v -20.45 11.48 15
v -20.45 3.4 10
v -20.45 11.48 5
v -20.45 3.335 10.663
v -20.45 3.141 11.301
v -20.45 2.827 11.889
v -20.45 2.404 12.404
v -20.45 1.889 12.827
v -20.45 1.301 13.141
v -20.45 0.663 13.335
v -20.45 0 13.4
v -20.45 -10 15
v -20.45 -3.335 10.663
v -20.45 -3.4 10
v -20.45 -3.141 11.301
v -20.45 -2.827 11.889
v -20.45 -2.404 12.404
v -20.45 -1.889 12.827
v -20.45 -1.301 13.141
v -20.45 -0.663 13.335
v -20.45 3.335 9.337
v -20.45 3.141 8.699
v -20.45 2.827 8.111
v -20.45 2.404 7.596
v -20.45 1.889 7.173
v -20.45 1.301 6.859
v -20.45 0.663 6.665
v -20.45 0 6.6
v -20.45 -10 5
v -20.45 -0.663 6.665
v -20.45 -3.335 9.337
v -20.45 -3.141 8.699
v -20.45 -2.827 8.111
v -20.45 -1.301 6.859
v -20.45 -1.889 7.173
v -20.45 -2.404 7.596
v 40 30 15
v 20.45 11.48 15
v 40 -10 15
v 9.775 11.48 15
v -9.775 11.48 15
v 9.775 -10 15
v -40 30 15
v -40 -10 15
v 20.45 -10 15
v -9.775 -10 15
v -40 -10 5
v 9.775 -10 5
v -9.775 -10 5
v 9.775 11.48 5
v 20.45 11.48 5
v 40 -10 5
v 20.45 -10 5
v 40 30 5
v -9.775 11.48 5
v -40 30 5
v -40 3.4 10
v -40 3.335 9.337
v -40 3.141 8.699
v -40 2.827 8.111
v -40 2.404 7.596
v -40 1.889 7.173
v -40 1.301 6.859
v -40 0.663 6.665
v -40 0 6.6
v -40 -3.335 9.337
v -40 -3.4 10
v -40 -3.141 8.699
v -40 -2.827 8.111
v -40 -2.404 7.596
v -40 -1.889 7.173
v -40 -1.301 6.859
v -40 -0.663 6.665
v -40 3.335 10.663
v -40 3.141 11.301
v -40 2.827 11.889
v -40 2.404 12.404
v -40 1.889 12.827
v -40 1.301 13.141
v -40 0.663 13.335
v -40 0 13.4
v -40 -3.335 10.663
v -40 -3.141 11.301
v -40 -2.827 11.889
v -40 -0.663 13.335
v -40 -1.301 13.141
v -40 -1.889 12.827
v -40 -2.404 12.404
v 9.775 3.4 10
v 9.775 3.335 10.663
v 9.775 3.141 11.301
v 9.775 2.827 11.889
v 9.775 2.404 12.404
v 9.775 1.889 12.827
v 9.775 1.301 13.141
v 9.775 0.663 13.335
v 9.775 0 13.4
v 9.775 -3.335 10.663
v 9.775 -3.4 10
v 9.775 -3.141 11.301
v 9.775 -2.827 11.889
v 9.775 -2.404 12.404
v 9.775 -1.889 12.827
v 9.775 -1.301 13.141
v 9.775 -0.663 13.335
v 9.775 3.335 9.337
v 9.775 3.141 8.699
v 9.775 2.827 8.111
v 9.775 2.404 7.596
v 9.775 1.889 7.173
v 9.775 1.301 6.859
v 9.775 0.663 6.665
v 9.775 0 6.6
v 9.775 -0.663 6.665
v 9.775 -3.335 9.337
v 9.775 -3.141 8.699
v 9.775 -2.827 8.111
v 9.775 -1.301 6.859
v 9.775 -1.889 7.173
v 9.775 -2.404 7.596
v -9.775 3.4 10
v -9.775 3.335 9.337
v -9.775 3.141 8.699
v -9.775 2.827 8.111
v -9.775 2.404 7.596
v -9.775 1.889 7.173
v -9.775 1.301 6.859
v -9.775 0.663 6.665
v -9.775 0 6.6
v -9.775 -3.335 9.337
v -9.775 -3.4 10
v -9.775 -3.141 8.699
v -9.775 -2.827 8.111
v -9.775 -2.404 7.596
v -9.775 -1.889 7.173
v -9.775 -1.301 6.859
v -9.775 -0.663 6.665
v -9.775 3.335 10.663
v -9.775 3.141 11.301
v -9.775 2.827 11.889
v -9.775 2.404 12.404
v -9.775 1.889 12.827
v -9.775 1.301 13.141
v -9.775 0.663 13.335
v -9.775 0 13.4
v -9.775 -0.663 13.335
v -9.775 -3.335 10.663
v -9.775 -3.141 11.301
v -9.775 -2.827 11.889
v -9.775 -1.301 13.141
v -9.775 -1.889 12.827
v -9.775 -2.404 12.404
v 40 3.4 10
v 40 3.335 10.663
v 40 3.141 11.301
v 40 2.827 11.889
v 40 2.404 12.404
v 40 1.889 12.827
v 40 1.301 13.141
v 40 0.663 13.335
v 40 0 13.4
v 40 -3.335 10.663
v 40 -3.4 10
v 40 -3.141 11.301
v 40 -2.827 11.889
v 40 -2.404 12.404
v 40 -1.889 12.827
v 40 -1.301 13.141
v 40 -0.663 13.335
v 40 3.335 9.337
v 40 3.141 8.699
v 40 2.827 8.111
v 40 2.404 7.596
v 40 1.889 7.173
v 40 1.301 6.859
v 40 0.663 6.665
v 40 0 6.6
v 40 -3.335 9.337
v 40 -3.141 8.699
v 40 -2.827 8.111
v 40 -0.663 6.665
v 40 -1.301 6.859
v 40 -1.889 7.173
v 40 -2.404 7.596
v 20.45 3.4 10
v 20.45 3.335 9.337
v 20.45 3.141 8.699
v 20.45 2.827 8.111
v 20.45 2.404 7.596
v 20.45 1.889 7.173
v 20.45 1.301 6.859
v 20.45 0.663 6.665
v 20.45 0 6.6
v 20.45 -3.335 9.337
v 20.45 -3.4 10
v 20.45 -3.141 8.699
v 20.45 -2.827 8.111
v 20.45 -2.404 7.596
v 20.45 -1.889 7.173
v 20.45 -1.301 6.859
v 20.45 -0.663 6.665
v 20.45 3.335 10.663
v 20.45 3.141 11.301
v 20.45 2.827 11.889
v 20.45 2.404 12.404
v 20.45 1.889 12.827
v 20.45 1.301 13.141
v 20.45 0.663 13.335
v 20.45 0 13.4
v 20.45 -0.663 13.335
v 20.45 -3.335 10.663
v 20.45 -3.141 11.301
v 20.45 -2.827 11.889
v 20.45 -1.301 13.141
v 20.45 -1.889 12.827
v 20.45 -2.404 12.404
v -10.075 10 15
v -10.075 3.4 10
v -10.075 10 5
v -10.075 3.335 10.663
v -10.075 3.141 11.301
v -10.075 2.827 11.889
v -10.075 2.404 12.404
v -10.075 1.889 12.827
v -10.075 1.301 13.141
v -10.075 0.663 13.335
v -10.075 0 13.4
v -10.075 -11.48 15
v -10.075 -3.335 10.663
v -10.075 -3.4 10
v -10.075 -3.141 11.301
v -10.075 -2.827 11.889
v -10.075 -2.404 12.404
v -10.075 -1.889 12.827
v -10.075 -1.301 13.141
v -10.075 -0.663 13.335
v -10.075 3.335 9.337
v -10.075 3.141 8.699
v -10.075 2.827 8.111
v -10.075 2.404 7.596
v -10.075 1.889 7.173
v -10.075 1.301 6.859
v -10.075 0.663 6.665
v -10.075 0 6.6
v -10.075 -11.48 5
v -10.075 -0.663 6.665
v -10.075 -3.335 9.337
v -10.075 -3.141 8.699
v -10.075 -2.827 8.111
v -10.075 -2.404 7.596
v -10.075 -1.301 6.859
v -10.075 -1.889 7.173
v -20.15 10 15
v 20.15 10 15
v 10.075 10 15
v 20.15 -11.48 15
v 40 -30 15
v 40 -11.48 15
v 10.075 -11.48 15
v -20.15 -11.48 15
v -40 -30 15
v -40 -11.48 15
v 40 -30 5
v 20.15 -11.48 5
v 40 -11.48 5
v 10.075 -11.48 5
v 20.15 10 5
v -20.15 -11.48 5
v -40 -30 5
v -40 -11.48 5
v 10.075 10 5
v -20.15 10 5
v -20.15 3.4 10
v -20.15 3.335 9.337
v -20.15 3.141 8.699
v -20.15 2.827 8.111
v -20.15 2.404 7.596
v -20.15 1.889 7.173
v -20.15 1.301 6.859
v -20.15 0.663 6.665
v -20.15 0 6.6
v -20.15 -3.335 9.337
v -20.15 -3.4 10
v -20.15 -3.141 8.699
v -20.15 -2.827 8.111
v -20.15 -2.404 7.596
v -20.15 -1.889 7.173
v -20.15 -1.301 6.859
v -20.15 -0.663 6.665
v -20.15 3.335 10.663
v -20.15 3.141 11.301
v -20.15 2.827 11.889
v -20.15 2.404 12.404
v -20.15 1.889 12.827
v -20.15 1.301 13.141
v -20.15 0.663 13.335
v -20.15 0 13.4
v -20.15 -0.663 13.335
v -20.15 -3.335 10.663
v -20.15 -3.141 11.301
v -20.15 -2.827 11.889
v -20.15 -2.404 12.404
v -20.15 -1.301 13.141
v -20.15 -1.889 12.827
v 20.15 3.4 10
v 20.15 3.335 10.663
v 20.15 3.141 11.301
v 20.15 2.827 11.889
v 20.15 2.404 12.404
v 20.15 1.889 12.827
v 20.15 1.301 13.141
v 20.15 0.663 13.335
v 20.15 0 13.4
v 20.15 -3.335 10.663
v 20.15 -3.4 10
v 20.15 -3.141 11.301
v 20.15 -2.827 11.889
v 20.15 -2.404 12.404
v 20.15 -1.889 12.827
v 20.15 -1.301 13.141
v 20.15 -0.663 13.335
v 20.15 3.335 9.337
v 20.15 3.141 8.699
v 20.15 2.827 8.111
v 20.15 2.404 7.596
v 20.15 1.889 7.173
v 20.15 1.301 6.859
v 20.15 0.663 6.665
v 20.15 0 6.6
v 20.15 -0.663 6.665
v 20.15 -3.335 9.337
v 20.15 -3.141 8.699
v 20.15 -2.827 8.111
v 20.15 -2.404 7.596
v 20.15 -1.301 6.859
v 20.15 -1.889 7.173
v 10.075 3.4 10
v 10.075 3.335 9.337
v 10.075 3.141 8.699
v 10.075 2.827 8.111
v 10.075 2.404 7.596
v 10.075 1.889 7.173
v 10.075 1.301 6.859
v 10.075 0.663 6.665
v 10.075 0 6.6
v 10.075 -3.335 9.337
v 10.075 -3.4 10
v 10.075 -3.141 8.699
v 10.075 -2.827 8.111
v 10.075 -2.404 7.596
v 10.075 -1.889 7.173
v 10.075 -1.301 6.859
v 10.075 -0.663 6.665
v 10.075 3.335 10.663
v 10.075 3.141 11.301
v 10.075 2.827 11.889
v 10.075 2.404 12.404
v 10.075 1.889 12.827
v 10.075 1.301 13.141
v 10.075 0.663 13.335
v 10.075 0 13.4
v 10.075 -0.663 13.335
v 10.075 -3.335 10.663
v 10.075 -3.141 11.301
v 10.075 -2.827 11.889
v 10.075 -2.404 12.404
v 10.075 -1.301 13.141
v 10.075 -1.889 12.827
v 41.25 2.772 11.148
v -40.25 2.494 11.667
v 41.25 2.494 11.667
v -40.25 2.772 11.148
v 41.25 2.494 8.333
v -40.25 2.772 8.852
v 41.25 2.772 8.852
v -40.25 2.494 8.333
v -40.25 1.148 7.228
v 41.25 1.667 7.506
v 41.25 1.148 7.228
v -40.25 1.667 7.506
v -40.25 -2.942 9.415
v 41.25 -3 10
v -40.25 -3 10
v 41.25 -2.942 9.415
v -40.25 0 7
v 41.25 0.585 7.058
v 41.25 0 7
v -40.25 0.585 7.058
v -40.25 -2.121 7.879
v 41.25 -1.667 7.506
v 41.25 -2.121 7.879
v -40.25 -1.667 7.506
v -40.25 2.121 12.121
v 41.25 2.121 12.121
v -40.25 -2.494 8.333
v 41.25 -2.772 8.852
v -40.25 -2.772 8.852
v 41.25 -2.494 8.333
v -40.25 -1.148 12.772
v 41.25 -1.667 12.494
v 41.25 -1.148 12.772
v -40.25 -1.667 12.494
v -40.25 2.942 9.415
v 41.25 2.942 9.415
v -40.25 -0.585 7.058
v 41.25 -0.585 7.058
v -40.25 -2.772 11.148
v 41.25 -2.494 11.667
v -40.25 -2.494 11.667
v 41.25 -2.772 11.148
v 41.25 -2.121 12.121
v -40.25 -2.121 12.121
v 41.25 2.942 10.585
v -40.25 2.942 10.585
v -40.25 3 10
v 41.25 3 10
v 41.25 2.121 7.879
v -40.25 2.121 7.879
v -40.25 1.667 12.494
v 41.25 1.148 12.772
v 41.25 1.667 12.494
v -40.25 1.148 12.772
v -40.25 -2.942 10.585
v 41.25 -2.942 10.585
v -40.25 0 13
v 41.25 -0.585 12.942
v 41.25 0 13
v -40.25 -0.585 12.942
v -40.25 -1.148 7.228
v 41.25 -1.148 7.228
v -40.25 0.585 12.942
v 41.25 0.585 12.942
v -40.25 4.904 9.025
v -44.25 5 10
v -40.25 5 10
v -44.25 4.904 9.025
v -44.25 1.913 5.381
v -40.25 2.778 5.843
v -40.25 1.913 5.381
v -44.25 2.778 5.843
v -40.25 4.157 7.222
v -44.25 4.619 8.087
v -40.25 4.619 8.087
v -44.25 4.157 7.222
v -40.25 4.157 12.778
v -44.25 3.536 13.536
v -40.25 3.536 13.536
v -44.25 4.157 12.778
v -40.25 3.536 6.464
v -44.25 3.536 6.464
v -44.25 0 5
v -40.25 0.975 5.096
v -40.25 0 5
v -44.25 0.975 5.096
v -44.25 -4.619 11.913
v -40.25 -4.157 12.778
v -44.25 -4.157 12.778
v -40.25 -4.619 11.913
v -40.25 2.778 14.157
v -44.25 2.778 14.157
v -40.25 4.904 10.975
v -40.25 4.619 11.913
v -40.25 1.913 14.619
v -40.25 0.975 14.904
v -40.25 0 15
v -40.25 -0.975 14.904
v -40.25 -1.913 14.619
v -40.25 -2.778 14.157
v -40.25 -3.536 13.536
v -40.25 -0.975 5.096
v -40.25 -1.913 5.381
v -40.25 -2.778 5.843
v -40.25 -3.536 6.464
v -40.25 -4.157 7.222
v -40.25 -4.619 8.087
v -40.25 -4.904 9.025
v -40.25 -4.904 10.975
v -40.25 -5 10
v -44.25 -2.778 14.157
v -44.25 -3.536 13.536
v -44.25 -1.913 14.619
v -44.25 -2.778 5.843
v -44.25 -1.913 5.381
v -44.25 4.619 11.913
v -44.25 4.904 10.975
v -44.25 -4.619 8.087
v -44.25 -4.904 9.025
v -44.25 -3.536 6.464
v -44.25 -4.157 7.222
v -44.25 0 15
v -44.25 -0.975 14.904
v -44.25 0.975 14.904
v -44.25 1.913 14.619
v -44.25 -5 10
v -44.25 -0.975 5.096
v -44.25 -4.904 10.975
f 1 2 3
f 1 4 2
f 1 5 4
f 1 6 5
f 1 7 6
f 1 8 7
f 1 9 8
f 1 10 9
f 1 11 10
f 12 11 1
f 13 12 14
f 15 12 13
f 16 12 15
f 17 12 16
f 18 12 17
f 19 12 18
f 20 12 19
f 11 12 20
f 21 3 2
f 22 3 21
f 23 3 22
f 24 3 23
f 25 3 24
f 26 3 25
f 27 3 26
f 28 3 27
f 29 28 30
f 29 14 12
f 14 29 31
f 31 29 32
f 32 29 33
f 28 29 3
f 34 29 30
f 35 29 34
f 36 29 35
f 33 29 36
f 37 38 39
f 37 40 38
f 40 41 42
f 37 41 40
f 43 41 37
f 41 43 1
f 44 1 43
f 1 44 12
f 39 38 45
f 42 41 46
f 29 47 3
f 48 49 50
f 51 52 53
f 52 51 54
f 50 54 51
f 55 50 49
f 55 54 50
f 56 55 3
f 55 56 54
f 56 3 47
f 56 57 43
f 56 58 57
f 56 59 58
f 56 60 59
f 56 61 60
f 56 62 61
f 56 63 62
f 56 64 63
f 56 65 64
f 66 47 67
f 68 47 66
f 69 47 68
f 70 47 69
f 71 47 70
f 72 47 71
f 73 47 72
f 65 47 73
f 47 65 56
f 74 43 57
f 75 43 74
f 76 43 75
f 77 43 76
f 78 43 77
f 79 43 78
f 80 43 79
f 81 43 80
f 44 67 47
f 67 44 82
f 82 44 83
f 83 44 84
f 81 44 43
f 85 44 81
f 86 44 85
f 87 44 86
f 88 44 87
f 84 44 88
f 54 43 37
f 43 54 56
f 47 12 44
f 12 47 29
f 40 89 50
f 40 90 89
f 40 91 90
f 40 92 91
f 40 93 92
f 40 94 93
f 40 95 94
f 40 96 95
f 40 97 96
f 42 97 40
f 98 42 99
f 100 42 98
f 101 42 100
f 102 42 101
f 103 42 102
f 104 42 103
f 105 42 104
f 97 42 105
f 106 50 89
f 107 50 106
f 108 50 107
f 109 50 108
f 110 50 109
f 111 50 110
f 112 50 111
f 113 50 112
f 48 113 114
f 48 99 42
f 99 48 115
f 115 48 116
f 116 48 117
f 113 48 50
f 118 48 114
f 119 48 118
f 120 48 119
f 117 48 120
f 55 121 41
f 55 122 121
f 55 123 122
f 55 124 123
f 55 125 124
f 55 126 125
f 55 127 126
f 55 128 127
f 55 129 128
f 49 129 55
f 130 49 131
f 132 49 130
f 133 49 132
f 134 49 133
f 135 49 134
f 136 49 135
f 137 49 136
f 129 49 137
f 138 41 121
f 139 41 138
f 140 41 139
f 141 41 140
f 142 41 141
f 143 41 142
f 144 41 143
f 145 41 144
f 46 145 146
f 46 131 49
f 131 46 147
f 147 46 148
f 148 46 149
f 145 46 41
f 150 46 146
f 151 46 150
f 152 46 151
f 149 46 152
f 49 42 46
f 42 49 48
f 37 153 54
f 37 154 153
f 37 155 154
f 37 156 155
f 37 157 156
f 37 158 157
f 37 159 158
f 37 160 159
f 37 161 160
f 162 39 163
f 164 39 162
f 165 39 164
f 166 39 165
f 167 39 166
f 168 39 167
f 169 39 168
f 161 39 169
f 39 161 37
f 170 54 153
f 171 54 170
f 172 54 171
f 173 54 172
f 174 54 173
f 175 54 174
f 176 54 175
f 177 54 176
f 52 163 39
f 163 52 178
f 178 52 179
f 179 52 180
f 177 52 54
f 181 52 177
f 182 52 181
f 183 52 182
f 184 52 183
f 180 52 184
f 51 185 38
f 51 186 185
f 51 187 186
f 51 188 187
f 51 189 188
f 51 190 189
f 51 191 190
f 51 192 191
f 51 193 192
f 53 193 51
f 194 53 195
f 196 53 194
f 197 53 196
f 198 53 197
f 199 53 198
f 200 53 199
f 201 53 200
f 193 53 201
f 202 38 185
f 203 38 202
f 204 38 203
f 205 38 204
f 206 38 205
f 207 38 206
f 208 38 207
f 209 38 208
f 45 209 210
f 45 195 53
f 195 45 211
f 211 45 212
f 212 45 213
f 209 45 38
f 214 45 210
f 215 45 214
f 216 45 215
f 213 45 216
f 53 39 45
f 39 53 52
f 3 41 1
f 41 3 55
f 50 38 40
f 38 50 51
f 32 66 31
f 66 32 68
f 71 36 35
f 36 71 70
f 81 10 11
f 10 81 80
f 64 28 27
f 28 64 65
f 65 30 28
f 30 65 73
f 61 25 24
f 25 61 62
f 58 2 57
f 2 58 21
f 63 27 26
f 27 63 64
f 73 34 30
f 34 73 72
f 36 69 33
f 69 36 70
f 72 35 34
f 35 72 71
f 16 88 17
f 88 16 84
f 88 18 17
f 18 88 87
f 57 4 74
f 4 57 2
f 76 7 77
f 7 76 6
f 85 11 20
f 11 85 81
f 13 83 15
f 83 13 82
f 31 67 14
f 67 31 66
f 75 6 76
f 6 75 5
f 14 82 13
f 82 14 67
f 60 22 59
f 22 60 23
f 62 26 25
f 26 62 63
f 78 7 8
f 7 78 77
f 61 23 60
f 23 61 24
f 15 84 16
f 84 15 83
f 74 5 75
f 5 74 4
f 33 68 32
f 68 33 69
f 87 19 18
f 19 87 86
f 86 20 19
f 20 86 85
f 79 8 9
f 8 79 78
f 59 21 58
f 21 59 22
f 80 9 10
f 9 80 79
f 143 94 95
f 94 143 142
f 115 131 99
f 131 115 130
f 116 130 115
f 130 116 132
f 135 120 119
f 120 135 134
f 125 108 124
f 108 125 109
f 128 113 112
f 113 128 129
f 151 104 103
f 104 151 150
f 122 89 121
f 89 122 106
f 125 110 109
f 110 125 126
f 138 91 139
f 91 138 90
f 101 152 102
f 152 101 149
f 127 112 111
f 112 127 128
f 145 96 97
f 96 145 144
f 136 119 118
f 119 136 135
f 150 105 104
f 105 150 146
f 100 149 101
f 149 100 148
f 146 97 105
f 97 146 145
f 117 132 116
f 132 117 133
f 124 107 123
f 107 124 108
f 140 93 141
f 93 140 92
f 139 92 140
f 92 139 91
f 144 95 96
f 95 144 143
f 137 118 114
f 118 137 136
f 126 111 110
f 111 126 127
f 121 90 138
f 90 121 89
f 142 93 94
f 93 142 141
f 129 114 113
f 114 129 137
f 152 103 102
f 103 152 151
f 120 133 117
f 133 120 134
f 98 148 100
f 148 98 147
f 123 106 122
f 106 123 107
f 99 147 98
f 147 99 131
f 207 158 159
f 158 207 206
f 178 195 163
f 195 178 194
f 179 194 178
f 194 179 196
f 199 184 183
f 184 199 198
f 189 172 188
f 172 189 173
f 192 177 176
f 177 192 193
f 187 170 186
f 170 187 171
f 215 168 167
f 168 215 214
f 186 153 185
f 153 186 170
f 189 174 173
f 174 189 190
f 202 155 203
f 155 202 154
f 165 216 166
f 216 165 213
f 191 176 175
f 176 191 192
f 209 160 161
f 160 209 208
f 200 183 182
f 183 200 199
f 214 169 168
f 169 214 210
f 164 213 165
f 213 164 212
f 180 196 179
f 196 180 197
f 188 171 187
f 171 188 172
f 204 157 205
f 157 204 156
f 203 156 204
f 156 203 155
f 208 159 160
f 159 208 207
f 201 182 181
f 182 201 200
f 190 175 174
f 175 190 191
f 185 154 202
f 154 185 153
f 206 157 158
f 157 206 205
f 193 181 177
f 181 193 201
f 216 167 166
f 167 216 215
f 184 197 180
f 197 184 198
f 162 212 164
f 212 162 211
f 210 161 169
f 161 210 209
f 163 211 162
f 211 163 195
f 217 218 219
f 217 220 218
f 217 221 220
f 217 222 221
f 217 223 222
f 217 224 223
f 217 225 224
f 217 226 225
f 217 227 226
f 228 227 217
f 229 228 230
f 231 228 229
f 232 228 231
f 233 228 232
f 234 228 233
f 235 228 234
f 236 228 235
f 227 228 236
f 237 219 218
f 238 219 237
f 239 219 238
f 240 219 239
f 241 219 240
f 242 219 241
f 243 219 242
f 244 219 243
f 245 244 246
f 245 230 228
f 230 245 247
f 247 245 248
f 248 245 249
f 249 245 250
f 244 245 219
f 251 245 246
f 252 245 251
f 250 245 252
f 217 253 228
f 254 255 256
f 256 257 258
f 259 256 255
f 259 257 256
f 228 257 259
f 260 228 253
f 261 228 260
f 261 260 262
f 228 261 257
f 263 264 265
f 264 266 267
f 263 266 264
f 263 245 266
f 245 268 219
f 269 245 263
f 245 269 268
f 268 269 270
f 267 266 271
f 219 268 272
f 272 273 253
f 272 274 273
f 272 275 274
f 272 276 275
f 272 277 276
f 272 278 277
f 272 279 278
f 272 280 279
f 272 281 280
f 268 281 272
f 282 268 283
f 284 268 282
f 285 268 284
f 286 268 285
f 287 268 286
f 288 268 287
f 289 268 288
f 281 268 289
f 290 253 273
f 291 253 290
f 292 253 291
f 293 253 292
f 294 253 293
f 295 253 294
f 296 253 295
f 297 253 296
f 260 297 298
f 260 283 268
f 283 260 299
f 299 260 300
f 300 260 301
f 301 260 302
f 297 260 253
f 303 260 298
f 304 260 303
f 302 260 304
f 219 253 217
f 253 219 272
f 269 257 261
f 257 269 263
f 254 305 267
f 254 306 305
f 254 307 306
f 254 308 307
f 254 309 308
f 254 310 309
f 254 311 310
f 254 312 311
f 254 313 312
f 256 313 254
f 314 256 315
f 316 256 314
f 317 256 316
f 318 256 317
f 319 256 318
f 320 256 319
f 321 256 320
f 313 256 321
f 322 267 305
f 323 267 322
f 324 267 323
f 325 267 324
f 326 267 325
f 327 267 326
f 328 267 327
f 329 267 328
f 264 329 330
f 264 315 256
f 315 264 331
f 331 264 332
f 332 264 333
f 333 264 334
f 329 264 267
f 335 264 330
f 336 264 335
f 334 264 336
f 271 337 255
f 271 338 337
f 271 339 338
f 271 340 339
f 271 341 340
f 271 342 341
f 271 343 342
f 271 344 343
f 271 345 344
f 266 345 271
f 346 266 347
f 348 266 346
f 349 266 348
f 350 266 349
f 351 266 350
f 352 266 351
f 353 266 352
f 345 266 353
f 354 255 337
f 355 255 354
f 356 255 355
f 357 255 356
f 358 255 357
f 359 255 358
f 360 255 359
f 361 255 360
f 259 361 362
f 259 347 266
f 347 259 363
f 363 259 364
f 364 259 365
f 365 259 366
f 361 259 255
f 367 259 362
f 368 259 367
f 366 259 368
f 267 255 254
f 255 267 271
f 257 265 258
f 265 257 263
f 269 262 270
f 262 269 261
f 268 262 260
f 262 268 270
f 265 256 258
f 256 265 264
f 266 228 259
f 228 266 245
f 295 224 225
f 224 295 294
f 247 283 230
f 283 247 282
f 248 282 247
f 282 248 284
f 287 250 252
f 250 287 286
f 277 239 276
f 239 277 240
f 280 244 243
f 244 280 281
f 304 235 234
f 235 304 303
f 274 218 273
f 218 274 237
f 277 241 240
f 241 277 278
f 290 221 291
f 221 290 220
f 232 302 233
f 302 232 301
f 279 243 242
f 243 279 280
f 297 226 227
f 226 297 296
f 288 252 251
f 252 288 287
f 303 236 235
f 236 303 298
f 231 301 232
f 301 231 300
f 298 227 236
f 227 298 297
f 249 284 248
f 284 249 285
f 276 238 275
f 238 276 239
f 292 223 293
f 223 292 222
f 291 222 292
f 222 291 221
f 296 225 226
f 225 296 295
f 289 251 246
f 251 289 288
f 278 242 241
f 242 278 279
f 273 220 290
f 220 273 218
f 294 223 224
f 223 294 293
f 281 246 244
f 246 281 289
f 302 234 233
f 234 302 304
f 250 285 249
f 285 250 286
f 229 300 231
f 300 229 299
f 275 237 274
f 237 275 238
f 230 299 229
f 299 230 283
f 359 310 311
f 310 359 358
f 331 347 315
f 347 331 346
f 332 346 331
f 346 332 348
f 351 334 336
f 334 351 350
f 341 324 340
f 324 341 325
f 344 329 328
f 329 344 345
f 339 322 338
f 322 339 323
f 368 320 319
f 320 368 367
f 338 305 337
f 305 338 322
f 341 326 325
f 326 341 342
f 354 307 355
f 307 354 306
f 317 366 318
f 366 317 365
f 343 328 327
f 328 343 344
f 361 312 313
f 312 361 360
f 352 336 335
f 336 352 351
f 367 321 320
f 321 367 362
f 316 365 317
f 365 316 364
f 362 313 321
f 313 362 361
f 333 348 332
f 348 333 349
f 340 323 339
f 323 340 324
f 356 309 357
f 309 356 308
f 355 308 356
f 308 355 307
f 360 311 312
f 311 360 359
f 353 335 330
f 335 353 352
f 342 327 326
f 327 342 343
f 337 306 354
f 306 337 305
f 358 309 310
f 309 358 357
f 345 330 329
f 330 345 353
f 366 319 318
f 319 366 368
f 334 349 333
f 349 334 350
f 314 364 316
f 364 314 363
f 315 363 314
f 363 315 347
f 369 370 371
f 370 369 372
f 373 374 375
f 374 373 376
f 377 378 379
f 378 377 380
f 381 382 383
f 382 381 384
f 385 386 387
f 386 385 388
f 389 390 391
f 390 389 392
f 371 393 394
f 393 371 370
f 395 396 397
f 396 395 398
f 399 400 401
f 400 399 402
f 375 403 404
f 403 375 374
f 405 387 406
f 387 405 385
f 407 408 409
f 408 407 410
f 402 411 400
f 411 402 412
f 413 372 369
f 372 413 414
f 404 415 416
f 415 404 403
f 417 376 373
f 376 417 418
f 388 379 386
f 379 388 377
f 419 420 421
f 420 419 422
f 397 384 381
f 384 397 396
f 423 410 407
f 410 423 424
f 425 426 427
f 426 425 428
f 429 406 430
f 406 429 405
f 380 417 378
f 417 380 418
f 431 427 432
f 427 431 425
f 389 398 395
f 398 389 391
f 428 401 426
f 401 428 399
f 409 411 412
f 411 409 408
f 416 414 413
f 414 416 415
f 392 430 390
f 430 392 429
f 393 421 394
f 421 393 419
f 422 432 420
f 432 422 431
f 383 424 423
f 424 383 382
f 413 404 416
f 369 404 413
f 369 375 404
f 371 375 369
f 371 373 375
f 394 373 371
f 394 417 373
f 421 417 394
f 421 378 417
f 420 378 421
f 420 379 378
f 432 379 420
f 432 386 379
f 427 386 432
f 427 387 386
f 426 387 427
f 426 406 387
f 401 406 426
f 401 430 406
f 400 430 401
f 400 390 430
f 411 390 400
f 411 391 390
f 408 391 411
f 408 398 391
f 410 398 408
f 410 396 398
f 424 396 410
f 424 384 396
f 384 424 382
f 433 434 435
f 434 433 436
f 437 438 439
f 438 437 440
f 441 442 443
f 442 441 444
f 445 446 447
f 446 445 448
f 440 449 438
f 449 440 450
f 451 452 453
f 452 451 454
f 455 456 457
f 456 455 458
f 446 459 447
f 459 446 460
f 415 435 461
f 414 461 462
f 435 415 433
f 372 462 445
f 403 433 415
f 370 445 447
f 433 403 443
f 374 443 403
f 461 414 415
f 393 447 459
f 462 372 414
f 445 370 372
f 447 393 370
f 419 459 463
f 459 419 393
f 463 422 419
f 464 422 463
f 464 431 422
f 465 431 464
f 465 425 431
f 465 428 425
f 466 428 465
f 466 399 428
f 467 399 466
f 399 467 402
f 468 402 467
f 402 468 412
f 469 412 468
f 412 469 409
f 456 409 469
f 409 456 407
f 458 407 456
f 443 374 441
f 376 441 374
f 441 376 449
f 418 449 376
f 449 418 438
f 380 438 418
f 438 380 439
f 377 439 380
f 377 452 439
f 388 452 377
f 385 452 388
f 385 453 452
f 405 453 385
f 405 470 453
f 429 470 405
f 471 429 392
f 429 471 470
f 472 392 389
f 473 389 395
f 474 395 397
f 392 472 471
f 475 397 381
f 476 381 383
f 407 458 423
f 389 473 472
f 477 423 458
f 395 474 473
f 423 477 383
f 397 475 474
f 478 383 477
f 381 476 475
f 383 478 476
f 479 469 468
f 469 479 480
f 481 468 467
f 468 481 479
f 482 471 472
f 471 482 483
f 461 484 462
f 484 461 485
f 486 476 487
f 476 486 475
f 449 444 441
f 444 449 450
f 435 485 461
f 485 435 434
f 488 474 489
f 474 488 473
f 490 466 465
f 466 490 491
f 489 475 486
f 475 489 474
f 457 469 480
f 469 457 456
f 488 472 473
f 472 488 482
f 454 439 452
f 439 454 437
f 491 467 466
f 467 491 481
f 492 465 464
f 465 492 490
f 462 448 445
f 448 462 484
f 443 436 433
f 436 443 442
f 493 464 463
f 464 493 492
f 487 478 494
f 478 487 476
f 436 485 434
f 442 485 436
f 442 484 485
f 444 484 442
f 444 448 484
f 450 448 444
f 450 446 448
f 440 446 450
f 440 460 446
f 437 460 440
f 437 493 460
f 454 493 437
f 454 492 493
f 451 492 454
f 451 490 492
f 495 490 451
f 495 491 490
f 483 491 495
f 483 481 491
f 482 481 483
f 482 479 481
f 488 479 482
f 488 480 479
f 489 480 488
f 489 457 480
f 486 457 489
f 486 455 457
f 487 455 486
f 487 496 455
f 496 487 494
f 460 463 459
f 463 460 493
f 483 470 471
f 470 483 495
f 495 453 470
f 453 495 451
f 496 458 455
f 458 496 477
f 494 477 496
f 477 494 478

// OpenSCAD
$fn = 32;

// ------------------------------------------------------------------------
// Butt hinge: hinge 80 mm, leaf swung 0 deg
// Every part is its own module, assembly() places every instance.
// ------------------------------------------------------------------------

// --- part 1 ---
module hinge_base() {
  difference() {
    union() {
      translate([-40, -10, -5]) cube([19.55, 40, 10]);
      translate([-9.775, -10, -5]) cube([19.55, 40, 10]);
      translate([20.45, -10, -5]) cube([19.55, 40, 10]);
      translate([-40, 11.48, -5]) cube([80, 18.52, 10]);
    }
    translate([-30.225, 0, 0]) rotate([0, 90, 0]) cylinder(h = 21.55, d = 6.8, center = true);
    translate([0, 0, 0]) rotate([0, 90, 0]) cylinder(h = 21.55, d = 6.8, center = true);
    translate([30.225, 0, 0]) rotate([0, 90, 0]) cylinder(h = 21.55, d = 6.8, center = true);
  }
}

// --- part 2 ---
module hinge_mover() {
  difference() {
    union() {
      translate([-20.15, -30, -5]) cube([10.075, 40, 10]);
      translate([10.075, -30, -5]) cube([10.075, 40, 10]);
      translate([-40, -30, -5]) cube([80, 18.52, 10]);
    }
    translate([-15.113, 0, 0]) rotate([0, 90, 0]) cylinder(h = 12.075, d = 6.8, center = true);
    translate([15.113, 0, 0]) rotate([0, 90, 0]) cylinder(h = 12.075, d = 6.8, center = true);
  }
}

// --- part 3 ---
module hinge_pin() {
  rotate([0, 90, 0]) cylinder(h = 82.5, d = 6, center = true);
  translate([-44.25, 0, 0]) rotate([0, 90, 0]) cylinder(h = 4, d = 10);
}

// --- assembly ---
module assembly() {
  color([0.80, 0.24, 0.20]) translate([0, 0, 10]) rotate([0, 0, 0]) hinge_base();
  color([0.20, 0.45, 0.75]) translate([0, 0, 10]) rotate([0, 0, 0]) hinge_mover();
  color([0.25, 0.62, 0.32]) translate([0, 0, 10]) rotate([0, 0, 0]) hinge_pin();
}

assembly();
